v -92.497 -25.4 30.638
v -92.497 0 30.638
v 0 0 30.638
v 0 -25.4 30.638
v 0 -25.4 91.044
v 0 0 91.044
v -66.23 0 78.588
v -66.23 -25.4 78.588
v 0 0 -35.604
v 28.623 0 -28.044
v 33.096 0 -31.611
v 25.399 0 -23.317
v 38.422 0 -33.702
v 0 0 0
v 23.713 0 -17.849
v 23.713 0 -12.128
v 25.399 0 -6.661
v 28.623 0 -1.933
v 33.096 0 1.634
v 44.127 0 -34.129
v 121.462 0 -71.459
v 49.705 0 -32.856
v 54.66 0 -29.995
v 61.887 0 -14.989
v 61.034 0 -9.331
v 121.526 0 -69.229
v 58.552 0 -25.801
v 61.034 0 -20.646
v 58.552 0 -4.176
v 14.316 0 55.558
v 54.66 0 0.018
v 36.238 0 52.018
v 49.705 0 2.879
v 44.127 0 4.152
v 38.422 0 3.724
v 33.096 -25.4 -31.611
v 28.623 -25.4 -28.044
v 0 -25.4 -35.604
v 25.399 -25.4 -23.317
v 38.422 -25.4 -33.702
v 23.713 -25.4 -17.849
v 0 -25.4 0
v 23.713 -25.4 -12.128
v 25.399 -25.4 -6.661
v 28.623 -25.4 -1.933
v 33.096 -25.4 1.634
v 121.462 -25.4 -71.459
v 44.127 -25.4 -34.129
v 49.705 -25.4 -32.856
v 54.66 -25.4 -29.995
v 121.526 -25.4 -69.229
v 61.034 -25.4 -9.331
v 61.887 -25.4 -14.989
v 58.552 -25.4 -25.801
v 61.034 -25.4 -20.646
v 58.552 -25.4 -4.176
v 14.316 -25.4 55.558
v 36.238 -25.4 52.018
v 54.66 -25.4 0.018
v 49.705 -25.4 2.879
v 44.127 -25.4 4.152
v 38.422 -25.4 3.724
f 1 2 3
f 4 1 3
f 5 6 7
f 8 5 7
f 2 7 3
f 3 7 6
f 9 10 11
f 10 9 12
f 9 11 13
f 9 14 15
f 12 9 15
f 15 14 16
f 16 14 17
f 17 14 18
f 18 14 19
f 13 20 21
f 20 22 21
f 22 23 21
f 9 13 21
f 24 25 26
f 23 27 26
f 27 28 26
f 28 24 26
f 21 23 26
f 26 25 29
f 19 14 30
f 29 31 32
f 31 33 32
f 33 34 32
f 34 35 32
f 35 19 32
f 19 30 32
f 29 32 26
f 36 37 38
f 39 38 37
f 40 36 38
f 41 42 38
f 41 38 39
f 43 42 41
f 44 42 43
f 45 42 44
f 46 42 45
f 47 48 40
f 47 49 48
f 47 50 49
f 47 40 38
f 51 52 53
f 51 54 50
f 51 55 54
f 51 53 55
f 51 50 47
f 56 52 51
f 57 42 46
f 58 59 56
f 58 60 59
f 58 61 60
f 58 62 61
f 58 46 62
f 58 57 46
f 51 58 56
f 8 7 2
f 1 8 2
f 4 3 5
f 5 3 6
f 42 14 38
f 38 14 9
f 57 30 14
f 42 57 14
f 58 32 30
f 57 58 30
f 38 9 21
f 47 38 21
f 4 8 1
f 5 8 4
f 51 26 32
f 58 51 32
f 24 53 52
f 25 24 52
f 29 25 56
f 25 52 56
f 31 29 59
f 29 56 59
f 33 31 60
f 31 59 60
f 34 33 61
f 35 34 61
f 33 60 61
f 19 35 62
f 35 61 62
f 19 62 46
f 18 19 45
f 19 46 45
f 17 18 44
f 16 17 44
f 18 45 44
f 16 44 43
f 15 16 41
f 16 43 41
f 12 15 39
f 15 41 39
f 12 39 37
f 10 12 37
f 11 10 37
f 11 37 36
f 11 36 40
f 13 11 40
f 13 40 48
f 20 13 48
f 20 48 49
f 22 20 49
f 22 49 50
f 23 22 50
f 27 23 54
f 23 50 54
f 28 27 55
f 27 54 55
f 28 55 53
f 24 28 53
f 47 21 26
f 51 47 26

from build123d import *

# Parameters (mm, degrees)
F1_DEPTH = 25.4
F2_R     = 19.194292
F3_DEPTH = 25.4
F5_DEPTH = 25.4


with BuildPart() as f1:
    # F0 (on Front) → F1 (new body)
    with BuildSketch(Plane.XZ):
        Polygon((14.315575, 55.558085), (0, 0), (0, -35.604056), (121.462278, -71.45904), (121.52645, -69.229051), (36.238439, 52.01849), align=None)
    extrude(amount=F1_DEPTH)

    # F2 (on face) → F3 (cut)
    with BuildSketch(Plane.XZ.offset(25.4)):
        with Locations((42.692915, -14.988674)):
            Circle(F2_R)
    extrude(amount=-F3_DEPTH, mode=Mode.SUBTRACT)


with BuildPart() as f5:
    # F4 (on Front) → F5 (new body)
    with BuildSketch(Plane.XZ):
        Polygon((-66.230401, 78.588381), (-92.49682, 30.638449), (0, 30.638449), (0, 91.044433), align=None)
    extrude(amount=F5_DEPTH)


solid = Compound([f1.part, f5.part])
